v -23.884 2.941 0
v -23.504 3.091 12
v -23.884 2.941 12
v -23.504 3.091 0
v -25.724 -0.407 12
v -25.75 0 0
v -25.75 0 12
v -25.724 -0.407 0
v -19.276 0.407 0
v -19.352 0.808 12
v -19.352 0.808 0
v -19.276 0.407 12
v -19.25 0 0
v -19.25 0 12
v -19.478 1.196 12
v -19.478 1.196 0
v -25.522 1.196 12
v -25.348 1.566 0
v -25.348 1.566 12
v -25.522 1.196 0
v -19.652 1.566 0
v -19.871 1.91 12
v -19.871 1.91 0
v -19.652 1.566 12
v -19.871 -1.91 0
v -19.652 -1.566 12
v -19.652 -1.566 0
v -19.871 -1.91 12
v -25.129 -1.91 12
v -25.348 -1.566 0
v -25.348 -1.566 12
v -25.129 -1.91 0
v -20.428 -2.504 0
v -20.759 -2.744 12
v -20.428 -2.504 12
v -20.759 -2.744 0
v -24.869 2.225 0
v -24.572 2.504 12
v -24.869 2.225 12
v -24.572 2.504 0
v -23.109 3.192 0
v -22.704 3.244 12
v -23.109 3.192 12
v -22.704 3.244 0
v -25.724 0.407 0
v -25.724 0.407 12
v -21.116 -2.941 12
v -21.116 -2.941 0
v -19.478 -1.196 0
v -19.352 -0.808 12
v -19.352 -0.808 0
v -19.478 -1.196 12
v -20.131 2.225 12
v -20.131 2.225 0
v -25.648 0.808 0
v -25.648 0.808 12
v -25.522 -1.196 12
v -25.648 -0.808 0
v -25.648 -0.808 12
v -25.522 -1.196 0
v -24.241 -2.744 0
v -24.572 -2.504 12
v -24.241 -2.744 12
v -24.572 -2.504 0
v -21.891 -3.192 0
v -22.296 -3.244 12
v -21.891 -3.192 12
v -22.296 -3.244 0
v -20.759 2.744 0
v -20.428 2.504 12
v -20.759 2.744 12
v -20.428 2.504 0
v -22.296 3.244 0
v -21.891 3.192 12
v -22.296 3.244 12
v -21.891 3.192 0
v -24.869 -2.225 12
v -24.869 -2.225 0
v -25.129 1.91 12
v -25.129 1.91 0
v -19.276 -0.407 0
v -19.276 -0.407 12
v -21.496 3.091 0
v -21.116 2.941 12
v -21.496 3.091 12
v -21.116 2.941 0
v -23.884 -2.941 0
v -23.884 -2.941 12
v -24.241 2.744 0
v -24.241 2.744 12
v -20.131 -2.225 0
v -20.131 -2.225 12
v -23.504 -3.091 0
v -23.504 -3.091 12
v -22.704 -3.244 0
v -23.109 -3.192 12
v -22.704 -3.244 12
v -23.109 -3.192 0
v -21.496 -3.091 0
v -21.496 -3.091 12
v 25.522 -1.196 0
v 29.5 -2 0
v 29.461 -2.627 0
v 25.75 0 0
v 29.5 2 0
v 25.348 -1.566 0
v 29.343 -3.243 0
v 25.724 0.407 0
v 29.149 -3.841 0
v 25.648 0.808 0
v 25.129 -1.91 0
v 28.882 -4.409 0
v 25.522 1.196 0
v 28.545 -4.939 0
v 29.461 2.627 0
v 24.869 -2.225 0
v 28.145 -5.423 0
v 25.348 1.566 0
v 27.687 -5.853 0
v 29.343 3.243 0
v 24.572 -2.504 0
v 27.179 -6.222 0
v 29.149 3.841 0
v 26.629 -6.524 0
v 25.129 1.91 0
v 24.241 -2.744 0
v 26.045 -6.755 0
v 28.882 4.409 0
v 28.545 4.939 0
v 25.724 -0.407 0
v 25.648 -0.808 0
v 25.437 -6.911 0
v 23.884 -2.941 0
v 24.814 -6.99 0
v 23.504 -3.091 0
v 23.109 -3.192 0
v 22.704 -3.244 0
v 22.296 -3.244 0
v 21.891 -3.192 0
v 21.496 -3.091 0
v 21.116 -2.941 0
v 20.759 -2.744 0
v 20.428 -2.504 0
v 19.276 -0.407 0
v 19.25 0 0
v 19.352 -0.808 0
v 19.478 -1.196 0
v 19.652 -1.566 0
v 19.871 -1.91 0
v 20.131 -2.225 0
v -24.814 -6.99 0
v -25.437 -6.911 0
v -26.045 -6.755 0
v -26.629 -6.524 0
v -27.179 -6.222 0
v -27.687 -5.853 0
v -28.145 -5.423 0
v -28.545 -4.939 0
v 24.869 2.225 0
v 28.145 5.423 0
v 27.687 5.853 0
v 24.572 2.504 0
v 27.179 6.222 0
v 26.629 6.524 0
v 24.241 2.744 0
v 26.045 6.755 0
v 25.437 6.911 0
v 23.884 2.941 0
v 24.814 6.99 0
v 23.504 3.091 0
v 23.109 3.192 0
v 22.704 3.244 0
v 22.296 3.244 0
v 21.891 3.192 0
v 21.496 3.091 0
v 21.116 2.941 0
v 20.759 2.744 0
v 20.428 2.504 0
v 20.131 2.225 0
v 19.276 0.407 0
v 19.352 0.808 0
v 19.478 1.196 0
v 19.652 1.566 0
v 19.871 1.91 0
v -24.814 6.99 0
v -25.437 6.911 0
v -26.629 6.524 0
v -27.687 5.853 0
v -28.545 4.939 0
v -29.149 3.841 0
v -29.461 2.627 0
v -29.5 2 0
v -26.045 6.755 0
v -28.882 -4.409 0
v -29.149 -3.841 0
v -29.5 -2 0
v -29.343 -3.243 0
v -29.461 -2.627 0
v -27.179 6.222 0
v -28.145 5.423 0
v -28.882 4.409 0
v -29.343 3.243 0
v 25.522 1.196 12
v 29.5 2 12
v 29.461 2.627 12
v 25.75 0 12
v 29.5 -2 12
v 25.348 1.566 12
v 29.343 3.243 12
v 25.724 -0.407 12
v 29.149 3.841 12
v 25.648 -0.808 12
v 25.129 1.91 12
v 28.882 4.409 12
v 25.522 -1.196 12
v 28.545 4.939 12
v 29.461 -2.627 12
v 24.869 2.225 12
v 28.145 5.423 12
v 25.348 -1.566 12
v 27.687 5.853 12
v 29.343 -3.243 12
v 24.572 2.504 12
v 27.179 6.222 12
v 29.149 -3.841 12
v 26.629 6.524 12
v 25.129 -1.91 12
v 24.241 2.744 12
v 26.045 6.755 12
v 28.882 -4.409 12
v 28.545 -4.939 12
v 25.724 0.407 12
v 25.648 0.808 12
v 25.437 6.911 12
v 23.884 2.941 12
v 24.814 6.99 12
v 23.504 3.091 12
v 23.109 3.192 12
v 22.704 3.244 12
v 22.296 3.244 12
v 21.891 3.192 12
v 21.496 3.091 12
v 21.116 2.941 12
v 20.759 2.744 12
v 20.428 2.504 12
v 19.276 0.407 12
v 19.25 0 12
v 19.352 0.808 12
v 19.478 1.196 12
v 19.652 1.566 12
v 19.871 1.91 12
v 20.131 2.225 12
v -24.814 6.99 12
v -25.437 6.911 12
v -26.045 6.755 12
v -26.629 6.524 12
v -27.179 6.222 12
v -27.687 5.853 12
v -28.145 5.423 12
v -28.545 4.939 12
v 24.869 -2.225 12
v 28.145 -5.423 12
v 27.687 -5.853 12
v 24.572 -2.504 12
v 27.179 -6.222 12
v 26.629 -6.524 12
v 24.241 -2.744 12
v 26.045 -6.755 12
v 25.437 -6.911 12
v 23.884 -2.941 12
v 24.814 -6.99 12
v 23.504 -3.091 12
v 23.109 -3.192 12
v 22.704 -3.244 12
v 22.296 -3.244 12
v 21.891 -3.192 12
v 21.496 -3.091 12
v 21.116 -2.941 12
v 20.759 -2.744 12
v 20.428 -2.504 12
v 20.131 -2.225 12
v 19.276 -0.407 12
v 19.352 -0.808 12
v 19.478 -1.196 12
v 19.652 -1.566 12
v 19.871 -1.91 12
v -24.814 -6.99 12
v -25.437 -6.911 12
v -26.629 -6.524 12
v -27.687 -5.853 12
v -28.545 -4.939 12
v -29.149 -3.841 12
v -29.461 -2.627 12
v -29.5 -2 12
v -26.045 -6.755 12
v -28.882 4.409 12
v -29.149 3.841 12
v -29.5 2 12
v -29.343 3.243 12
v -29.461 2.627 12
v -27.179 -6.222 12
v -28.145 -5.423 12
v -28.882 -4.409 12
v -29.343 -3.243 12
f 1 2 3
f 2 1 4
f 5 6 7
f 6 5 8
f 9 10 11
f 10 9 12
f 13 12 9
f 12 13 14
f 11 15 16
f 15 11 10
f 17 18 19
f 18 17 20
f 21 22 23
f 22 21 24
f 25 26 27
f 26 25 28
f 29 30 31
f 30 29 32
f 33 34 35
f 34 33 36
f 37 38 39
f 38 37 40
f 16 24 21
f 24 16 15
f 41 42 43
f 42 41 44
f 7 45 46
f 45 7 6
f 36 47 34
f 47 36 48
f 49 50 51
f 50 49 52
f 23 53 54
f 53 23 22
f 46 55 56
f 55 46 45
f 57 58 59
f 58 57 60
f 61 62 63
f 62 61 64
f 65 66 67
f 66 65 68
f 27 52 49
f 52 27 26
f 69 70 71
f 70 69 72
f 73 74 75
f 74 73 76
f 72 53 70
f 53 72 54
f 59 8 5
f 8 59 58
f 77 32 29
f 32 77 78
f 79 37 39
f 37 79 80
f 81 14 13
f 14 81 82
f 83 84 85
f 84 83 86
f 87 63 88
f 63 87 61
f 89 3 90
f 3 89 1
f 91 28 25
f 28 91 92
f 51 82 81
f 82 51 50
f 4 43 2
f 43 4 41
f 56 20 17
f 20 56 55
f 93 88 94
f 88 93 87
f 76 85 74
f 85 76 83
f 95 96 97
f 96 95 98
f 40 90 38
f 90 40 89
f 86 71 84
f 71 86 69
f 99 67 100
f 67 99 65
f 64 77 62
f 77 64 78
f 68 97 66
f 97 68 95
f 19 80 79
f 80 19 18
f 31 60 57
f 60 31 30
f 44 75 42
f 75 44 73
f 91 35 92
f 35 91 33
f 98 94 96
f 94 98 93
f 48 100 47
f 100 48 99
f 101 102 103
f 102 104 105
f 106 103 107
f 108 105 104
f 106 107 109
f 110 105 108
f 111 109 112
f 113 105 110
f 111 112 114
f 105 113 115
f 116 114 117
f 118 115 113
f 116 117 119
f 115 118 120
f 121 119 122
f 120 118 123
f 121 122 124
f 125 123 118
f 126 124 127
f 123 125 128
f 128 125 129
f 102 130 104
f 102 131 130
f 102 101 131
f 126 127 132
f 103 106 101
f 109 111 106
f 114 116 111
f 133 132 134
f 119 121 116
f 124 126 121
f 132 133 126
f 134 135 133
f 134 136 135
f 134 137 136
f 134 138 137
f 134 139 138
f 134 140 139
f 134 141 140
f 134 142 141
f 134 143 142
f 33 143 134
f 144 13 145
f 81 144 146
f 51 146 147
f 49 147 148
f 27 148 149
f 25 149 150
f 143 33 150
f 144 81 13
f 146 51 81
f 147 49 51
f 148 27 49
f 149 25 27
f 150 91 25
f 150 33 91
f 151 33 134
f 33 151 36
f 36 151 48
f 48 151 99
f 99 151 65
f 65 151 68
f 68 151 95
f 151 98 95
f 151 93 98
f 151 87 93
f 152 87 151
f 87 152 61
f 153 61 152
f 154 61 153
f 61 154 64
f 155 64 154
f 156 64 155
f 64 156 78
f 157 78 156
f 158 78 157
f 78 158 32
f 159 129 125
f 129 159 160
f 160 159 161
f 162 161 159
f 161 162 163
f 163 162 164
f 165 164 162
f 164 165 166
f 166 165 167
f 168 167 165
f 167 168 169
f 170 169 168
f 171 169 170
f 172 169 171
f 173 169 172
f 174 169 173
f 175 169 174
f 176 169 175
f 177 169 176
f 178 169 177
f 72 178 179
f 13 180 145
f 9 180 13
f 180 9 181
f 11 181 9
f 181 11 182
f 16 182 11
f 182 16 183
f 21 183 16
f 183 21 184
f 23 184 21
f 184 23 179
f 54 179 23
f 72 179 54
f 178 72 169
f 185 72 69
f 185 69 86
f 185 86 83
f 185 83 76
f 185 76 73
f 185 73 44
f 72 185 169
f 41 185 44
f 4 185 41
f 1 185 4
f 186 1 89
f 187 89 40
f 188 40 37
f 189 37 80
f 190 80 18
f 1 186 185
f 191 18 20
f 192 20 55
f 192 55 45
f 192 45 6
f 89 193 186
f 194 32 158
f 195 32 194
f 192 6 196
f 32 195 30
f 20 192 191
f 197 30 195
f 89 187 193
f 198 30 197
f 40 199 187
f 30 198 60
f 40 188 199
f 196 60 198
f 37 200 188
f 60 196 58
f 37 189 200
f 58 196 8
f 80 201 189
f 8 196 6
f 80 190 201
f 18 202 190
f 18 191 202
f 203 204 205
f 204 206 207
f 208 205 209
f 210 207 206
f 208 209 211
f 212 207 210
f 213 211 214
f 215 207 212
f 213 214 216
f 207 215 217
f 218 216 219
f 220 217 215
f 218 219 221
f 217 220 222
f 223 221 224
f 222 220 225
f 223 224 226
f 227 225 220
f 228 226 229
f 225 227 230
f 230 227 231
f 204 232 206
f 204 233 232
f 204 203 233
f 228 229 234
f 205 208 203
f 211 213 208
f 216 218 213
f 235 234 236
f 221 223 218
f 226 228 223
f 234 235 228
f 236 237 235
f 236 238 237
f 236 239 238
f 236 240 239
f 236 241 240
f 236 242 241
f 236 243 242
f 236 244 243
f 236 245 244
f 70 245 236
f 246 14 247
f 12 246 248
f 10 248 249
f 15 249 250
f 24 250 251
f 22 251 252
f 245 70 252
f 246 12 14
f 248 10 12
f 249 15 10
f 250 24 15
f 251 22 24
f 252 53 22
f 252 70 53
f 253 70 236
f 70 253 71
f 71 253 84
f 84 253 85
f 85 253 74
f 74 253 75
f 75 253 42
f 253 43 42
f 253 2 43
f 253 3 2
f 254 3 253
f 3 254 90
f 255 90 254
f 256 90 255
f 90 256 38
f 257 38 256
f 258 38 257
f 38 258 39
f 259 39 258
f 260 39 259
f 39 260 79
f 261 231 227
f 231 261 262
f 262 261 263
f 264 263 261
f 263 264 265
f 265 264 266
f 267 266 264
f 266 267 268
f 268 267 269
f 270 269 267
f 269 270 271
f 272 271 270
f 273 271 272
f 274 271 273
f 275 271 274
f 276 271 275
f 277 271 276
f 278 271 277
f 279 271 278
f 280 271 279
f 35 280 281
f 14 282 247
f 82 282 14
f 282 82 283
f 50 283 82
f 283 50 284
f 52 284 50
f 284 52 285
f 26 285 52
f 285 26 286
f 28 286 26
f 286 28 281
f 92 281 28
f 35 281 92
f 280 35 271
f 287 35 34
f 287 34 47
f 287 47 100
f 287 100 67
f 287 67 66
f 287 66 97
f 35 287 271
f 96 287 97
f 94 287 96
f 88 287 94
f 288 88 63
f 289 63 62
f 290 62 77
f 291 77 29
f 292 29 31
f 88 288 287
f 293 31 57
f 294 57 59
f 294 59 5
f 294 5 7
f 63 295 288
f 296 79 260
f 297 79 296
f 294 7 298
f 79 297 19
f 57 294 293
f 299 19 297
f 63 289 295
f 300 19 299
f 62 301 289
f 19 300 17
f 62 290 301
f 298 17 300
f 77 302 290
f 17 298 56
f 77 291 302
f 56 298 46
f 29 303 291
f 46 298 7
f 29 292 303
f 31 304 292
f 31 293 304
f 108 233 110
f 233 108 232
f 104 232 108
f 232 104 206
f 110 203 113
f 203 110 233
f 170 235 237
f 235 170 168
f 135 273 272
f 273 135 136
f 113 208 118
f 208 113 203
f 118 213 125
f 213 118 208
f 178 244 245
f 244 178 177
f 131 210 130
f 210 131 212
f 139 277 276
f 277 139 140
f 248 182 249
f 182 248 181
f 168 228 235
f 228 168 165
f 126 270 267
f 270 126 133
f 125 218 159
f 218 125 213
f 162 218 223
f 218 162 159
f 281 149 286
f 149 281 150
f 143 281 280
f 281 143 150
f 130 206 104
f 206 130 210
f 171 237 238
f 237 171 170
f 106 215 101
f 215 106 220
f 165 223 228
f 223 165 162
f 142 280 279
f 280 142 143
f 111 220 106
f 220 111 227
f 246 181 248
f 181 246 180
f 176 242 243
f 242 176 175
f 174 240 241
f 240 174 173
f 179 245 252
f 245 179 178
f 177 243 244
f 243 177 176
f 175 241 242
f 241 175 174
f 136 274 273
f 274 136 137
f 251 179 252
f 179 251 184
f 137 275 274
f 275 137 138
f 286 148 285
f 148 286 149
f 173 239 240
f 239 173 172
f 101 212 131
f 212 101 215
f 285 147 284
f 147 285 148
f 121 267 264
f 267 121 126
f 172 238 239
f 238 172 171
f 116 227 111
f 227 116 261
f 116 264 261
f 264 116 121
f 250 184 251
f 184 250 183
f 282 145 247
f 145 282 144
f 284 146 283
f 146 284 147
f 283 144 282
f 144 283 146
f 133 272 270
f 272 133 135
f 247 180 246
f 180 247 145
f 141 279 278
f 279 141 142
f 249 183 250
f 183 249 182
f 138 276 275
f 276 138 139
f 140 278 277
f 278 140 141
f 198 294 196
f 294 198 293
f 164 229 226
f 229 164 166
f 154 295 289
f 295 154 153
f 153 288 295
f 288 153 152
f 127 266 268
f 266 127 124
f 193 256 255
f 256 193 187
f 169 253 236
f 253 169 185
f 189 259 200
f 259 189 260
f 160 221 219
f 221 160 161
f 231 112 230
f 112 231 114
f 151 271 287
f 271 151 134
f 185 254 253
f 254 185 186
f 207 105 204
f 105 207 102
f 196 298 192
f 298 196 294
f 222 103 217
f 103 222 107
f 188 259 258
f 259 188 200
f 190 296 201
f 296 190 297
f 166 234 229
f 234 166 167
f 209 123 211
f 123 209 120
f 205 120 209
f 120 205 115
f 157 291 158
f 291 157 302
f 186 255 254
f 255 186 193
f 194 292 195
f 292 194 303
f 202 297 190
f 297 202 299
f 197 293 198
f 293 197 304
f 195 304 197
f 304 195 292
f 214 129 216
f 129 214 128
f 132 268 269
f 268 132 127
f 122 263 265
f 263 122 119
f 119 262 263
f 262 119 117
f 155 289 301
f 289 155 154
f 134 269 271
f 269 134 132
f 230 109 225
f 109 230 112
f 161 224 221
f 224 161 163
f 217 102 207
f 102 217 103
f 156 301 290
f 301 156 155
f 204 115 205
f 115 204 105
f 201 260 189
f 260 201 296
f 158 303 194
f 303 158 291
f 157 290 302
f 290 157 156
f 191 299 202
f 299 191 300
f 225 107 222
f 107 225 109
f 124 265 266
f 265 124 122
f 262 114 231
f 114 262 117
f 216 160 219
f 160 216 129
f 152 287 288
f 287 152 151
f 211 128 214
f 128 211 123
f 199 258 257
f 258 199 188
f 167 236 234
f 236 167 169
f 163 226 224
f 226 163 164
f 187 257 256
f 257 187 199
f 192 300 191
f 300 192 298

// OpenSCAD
$fn = 50;


difference() {
	union() {
		hull() {
			translate(v = [-24.5000000000, 2.0000000000, 0]) {
				cylinder(h = 12, r = 5);
			}
			translate(v = [24.5000000000, 2.0000000000, 0]) {
				cylinder(h = 12, r = 5);
			}
			translate(v = [-24.5000000000, -2.0000000000, 0]) {
				cylinder(h = 12, r = 5);
			}
			translate(v = [24.5000000000, -2.0000000000, 0]) {
				cylinder(h = 12, r = 5);
			}
		}
	}
	union() {
		translate(v = [-22.5000000000, 0.0000000000, 0]) {
			cylinder(h = 12, r = 3.2500000000);
		}
		translate(v = [22.5000000000, 0.0000000000, 0]) {
			cylinder(h = 12, r = 3.2500000000);
		}
		translate(v = [-22.5000000000, 0.0000000000, 0]) {
			cylinder(h = 12, r = 1.8000000000);
		}
		translate(v = [22.5000000000, 0.0000000000, 0]) {
			cylinder(h = 12, r = 1.8000000000);
		}
		translate(v = [-22.5000000000, 0.0000000000, 0]) {
			cylinder(h = 12, r = 1.8000000000);
		}
		translate(v = [22.5000000000, 0.0000000000, 0]) {
			cylinder(h = 12, r = 1.8000000000);
		}
		translate(v = [-22.5000000000, 0.0000000000, 0]) {
			cylinder(h = 12, r = 1.8000000000);
		}
		translate(v = [22.5000000000, 0.0000000000, 0]) {
			cylinder(h = 12, r = 1.8000000000);
		}
	}
}
